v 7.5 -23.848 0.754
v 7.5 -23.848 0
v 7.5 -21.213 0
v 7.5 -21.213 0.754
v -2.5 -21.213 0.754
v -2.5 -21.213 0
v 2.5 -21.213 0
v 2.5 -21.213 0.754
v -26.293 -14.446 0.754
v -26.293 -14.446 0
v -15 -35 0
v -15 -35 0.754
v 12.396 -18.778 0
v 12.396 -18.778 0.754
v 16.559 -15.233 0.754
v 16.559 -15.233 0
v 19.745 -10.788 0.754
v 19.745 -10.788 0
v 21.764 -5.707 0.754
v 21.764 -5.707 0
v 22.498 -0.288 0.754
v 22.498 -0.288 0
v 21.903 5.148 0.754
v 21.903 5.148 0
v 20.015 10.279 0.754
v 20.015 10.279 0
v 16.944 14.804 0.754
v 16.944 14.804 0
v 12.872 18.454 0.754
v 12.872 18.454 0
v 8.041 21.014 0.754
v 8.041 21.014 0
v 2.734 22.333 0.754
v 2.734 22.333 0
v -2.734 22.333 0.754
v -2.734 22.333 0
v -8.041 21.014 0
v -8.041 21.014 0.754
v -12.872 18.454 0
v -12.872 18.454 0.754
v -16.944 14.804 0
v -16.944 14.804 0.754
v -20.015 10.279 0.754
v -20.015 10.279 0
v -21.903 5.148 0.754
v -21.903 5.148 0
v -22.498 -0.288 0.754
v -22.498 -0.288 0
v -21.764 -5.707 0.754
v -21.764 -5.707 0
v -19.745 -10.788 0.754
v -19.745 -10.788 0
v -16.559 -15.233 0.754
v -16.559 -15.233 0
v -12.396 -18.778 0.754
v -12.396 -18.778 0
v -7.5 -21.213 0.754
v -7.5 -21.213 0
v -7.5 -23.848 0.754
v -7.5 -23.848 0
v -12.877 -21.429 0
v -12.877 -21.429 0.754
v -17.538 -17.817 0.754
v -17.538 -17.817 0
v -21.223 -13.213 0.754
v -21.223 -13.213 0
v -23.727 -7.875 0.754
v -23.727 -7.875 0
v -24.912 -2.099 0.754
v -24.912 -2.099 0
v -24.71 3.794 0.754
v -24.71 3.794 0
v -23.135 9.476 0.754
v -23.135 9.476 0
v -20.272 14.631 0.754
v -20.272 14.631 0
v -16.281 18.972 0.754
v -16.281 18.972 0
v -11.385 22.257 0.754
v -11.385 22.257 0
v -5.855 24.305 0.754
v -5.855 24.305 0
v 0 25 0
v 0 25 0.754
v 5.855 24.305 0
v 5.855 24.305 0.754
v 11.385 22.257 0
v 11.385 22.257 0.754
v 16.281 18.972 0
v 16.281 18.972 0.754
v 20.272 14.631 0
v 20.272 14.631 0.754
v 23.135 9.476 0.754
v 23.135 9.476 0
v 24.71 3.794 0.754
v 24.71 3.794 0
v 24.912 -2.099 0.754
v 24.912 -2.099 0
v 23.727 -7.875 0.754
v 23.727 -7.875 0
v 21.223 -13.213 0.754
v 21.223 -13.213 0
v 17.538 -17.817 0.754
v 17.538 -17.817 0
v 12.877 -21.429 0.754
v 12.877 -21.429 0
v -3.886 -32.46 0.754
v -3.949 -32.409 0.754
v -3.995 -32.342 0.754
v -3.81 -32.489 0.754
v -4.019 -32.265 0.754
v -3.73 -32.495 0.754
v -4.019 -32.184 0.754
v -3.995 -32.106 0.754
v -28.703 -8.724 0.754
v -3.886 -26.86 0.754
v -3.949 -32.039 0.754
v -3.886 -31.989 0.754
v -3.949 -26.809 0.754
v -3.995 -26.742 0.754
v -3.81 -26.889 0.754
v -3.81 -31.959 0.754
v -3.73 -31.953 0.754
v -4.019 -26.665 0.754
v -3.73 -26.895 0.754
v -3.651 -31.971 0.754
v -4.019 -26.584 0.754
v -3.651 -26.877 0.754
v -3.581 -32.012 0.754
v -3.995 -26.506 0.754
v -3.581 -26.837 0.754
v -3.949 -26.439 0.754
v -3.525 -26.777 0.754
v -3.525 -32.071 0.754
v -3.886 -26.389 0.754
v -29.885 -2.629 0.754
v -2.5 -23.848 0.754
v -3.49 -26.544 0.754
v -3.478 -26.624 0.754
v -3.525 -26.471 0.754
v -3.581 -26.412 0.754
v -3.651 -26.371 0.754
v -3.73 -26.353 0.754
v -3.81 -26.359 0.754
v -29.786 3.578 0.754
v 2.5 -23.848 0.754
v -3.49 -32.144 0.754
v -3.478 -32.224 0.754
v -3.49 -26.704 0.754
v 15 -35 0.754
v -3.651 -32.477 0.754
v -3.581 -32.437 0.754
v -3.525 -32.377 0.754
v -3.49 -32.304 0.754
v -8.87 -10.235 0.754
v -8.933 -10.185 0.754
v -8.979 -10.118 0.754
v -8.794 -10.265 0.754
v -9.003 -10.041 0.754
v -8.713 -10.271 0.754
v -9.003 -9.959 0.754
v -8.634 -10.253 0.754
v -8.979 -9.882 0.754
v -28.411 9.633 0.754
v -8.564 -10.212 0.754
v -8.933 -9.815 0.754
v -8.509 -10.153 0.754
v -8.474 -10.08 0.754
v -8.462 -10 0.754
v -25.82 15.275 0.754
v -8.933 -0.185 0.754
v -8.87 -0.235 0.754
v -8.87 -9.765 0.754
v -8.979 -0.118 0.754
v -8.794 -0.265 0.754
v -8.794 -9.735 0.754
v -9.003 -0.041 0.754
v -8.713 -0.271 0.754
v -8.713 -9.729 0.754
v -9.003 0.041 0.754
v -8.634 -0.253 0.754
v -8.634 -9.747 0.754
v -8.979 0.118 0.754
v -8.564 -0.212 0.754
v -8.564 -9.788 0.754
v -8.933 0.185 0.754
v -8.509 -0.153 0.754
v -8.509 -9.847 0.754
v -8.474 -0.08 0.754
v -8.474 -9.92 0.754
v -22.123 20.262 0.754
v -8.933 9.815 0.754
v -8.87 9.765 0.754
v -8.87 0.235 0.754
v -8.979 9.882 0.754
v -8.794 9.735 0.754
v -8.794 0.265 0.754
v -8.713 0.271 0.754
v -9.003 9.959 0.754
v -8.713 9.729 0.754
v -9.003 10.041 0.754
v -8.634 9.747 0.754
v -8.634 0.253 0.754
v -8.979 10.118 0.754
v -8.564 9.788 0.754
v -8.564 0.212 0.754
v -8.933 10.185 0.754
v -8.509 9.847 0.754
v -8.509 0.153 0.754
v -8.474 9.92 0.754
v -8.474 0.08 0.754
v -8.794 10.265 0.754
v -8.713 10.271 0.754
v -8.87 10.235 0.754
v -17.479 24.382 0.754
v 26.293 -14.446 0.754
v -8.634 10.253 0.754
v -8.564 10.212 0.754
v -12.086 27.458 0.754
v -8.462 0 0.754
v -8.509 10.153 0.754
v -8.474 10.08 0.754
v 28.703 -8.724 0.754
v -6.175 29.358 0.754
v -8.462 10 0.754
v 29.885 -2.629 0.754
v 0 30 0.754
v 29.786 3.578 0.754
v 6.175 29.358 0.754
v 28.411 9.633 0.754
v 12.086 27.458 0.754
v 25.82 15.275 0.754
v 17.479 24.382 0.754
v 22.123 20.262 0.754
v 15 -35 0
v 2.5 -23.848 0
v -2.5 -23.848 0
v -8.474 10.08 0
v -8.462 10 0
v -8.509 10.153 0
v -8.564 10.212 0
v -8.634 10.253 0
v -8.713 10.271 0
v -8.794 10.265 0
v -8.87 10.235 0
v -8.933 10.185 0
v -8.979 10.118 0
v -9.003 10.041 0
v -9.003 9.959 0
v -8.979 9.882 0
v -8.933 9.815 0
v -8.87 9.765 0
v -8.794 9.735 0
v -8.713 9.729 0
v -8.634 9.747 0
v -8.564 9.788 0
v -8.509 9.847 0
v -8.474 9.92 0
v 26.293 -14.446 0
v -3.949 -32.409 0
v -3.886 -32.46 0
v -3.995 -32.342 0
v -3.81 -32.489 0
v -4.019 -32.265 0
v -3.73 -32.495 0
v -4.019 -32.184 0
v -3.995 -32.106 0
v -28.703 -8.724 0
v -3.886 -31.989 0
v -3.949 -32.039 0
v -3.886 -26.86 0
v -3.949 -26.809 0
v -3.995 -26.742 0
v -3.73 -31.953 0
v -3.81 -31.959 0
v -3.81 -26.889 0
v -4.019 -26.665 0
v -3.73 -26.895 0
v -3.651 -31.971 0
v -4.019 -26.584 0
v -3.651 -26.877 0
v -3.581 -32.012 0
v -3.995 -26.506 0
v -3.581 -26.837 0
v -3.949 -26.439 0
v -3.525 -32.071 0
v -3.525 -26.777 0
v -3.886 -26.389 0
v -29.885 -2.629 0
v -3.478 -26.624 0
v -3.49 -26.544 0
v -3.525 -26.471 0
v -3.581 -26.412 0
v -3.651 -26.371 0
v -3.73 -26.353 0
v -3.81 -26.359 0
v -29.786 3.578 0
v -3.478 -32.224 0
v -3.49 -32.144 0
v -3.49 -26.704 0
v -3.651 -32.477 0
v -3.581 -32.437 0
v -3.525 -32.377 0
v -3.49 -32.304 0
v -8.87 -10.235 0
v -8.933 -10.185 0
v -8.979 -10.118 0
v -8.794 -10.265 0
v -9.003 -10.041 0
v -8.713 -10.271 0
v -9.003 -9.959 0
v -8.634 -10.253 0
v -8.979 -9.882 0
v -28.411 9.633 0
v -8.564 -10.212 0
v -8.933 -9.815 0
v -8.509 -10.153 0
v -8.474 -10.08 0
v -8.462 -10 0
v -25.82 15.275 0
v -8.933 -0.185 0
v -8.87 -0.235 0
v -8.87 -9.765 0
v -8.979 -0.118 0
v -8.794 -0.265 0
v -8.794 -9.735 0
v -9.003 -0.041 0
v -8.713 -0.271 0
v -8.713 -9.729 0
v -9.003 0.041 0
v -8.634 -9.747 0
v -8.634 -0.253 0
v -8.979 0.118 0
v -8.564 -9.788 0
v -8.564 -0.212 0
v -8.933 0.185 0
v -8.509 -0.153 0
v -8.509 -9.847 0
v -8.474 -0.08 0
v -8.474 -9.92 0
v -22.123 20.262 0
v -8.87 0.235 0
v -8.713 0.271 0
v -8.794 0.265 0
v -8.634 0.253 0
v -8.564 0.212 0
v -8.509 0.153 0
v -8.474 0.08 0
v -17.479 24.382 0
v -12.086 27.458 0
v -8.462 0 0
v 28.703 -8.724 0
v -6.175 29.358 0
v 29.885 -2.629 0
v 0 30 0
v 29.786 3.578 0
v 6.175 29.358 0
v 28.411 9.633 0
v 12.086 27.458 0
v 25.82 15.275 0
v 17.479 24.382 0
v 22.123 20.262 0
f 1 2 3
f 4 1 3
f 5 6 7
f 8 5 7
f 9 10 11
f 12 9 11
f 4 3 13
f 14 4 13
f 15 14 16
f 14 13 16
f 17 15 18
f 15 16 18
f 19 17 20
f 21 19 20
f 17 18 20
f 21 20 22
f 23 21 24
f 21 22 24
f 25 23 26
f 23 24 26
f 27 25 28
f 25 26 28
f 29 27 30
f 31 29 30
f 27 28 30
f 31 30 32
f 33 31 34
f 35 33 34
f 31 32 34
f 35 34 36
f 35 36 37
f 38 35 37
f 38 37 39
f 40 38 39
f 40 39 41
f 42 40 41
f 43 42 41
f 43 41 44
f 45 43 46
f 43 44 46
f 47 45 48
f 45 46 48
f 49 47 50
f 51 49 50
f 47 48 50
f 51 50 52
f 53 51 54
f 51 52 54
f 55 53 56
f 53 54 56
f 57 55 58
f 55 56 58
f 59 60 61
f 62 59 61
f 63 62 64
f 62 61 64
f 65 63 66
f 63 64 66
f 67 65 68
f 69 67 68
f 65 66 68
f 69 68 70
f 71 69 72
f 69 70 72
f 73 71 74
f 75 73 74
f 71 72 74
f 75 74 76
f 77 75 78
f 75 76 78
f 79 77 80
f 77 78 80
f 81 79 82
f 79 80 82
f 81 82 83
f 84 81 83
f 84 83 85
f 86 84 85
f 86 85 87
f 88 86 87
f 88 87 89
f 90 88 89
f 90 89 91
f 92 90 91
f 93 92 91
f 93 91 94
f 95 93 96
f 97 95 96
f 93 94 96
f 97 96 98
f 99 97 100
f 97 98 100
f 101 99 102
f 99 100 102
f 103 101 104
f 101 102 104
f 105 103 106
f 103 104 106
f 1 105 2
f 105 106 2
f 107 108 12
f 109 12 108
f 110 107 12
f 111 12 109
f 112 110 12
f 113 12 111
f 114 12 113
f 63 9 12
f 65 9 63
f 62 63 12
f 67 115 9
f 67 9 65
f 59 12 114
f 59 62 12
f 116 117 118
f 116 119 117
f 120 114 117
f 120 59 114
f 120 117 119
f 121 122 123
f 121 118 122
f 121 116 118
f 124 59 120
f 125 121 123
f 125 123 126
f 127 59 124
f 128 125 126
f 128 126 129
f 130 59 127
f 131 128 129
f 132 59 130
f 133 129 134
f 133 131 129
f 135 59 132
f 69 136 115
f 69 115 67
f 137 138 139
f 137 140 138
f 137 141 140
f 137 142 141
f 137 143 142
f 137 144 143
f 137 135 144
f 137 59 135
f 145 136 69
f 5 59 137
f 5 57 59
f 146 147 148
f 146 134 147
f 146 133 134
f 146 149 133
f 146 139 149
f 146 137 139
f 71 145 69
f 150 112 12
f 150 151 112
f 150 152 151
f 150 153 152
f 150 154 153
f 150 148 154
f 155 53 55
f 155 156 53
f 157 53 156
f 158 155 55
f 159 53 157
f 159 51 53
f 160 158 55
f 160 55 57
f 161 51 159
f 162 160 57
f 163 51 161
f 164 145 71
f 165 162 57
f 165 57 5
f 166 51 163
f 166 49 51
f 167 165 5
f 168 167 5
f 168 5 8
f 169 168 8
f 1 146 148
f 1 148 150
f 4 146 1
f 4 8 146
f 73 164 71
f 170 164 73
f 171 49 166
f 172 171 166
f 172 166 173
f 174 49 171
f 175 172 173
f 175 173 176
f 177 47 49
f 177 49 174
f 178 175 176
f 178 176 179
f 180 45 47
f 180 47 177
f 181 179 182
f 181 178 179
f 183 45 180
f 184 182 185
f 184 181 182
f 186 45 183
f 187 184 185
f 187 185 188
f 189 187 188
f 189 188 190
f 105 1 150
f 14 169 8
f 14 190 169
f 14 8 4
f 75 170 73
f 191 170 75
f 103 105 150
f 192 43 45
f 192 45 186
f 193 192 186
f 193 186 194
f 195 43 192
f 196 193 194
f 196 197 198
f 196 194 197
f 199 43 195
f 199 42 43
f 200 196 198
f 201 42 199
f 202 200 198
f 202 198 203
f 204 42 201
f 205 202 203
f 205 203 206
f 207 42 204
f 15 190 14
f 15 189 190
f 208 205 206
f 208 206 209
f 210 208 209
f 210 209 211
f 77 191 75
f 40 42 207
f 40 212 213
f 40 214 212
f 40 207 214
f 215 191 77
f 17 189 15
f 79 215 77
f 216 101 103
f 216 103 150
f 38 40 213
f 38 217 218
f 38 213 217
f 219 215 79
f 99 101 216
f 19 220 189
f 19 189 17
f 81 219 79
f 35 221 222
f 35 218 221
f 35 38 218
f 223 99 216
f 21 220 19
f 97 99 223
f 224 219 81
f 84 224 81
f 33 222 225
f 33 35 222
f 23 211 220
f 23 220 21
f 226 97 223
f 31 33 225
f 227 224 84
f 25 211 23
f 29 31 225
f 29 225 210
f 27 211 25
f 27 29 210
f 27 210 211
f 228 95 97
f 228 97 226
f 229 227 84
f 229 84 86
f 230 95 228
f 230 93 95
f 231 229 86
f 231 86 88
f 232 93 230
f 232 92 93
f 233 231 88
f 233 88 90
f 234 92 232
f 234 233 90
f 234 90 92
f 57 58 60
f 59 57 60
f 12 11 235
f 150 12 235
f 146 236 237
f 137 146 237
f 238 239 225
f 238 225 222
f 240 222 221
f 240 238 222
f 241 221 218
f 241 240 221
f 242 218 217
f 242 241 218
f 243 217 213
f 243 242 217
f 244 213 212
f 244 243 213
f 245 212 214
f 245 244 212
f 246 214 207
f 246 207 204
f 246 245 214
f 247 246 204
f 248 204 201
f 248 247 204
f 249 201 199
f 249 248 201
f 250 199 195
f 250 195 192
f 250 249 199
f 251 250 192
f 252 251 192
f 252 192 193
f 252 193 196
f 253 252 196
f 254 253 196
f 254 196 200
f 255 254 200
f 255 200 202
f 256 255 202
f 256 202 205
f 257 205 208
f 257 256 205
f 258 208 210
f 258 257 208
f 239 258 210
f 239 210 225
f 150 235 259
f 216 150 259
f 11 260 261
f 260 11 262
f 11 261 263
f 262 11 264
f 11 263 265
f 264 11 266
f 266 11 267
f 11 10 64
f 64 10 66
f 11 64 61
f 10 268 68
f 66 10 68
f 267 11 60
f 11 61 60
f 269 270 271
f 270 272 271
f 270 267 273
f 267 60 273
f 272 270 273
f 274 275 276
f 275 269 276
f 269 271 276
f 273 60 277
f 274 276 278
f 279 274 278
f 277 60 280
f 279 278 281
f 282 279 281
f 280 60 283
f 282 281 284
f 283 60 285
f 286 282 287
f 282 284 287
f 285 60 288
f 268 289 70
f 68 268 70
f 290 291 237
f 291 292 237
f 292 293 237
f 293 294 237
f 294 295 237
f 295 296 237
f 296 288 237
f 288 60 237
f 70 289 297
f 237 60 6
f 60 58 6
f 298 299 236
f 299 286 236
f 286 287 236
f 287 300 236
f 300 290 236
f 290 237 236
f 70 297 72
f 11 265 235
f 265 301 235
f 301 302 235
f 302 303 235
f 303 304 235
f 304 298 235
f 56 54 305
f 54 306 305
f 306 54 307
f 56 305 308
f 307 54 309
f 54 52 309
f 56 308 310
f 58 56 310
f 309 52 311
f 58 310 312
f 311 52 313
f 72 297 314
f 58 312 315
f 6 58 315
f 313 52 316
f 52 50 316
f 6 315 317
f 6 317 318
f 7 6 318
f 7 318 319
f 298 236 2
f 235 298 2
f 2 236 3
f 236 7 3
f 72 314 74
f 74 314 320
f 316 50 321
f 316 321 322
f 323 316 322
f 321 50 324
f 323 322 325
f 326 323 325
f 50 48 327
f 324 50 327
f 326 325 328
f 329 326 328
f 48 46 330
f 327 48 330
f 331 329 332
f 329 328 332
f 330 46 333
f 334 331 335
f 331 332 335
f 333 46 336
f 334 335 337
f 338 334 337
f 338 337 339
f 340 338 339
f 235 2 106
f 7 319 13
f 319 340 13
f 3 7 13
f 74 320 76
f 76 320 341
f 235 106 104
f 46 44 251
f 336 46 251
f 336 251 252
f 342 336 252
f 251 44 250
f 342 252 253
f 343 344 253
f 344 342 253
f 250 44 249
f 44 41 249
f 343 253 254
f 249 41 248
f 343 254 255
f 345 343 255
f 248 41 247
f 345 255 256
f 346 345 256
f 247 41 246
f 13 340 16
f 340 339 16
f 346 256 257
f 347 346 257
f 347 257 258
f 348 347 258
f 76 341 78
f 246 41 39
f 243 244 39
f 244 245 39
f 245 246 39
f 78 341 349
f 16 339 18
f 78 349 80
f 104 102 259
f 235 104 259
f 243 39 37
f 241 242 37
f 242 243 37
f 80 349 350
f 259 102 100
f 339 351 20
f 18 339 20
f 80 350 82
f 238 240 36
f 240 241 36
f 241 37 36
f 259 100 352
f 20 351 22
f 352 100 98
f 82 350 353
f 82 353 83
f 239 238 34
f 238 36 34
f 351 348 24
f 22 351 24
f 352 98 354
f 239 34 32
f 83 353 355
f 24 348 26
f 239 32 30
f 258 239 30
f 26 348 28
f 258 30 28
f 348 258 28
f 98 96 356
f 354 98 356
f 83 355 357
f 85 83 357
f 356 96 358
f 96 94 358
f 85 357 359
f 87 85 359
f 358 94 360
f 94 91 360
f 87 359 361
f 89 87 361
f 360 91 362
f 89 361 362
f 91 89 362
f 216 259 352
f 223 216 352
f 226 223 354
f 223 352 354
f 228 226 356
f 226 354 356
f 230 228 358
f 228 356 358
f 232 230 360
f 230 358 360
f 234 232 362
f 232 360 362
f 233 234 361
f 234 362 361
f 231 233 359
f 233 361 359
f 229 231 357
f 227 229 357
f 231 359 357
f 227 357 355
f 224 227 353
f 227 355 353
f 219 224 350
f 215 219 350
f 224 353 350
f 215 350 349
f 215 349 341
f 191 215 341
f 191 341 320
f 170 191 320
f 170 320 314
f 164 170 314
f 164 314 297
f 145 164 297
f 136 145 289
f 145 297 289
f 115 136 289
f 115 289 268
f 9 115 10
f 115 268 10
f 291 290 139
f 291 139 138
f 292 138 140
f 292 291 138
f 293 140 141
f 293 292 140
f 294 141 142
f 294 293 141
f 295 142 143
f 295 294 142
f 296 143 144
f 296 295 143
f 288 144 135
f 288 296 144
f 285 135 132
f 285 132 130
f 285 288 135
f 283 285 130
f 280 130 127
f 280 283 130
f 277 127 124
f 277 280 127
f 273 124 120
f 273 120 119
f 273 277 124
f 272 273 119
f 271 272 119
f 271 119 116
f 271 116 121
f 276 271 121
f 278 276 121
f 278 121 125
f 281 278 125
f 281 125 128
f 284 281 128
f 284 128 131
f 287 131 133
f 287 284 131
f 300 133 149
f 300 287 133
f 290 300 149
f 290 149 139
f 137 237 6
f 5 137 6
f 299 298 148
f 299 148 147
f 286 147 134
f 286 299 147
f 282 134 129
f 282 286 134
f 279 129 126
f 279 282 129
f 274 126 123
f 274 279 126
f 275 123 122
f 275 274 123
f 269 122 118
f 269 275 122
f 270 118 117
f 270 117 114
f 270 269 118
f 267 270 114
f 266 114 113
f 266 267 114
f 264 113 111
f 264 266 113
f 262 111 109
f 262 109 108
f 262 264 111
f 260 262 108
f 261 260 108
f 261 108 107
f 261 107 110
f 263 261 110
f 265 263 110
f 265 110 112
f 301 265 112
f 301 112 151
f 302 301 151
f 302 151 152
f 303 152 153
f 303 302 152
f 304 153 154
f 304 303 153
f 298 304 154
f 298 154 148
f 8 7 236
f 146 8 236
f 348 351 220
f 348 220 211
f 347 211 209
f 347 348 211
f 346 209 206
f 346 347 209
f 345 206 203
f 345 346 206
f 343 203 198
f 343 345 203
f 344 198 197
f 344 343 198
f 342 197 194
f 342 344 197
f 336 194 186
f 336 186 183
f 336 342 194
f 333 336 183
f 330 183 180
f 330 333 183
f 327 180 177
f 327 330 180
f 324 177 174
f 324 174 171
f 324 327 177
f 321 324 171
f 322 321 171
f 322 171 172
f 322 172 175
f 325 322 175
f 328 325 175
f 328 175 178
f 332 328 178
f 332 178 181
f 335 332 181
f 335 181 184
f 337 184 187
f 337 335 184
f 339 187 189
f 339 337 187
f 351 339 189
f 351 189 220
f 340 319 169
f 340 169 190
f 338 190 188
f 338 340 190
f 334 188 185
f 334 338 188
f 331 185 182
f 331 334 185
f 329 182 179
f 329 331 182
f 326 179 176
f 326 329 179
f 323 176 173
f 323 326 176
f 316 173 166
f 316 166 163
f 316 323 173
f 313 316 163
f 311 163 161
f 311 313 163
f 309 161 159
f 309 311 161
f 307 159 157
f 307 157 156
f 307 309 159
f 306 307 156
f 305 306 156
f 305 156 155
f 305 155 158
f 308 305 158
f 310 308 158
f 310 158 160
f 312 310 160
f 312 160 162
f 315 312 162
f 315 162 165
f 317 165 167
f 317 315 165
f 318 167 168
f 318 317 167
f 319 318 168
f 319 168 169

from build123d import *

# Parameters (mm, degrees)
SKETCH1_R           = 0.27178
BOSS_EXTRUDE1_DEPTH = 0.75438


with BuildPart() as part:
    # Sketch1 → Boss-Extrude1 (new body)
    with BuildSketch(Plane.XY):
        with BuildLine():
            Line((-26.292884648, -14.44590658), (-15, -35))
            Line((-15, -35), (-7.5, -35))
            Line((-7.5, -35), (15, -35))
            Line((15, -35), (26.292884648, -14.44590658))
            ThreePointArc((26.292884648, -14.44590658), (0, 30), (-26.292884648, -14.44590658))
        make_face()
        with Locations((-3.750000002, -32.224240034)):
            Circle(SKETCH1_R, mode=Mode.SUBTRACT)
        with Locations((-3.750000002, -26.624240034)):
            Circle(SKETCH1_R, mode=Mode.SUBTRACT)
        Polygon((2.5, -23.848480035), (-2.5, -23.848480035), (-2.5, -22.360679775), (-2.5, -21.213203436), (2.5, -21.213203436), (2.5, -22.360679775), align=None, mode=Mode.SUBTRACT)
        with Locations((-8.733792148, -10)):
            Circle(SKETCH1_R, mode=Mode.SUBTRACT)
        with Locations((-8.733792148, 0)):
            Circle(SKETCH1_R, mode=Mode.SUBTRACT)
        with BuildLine():
            Line((-7.5, -21.213203436), (-7.5, -23.848480035))
            ThreePointArc((-7.5, -23.848480035), (0, 25), (7.5, -23.848480035))
            Line((7.5, -23.848480035), (7.5, -21.213203436))
            ThreePointArc((7.5, -21.213203436), (0, 22.5), (-7.5, -21.213203436))
        make_face(mode=Mode.SUBTRACT)
        with Locations((-8.733792148, 10)):
            Circle(SKETCH1_R, mode=Mode.SUBTRACT)
    extrude(amount=BOSS_EXTRUDE1_DEPTH)


solid = part.part
